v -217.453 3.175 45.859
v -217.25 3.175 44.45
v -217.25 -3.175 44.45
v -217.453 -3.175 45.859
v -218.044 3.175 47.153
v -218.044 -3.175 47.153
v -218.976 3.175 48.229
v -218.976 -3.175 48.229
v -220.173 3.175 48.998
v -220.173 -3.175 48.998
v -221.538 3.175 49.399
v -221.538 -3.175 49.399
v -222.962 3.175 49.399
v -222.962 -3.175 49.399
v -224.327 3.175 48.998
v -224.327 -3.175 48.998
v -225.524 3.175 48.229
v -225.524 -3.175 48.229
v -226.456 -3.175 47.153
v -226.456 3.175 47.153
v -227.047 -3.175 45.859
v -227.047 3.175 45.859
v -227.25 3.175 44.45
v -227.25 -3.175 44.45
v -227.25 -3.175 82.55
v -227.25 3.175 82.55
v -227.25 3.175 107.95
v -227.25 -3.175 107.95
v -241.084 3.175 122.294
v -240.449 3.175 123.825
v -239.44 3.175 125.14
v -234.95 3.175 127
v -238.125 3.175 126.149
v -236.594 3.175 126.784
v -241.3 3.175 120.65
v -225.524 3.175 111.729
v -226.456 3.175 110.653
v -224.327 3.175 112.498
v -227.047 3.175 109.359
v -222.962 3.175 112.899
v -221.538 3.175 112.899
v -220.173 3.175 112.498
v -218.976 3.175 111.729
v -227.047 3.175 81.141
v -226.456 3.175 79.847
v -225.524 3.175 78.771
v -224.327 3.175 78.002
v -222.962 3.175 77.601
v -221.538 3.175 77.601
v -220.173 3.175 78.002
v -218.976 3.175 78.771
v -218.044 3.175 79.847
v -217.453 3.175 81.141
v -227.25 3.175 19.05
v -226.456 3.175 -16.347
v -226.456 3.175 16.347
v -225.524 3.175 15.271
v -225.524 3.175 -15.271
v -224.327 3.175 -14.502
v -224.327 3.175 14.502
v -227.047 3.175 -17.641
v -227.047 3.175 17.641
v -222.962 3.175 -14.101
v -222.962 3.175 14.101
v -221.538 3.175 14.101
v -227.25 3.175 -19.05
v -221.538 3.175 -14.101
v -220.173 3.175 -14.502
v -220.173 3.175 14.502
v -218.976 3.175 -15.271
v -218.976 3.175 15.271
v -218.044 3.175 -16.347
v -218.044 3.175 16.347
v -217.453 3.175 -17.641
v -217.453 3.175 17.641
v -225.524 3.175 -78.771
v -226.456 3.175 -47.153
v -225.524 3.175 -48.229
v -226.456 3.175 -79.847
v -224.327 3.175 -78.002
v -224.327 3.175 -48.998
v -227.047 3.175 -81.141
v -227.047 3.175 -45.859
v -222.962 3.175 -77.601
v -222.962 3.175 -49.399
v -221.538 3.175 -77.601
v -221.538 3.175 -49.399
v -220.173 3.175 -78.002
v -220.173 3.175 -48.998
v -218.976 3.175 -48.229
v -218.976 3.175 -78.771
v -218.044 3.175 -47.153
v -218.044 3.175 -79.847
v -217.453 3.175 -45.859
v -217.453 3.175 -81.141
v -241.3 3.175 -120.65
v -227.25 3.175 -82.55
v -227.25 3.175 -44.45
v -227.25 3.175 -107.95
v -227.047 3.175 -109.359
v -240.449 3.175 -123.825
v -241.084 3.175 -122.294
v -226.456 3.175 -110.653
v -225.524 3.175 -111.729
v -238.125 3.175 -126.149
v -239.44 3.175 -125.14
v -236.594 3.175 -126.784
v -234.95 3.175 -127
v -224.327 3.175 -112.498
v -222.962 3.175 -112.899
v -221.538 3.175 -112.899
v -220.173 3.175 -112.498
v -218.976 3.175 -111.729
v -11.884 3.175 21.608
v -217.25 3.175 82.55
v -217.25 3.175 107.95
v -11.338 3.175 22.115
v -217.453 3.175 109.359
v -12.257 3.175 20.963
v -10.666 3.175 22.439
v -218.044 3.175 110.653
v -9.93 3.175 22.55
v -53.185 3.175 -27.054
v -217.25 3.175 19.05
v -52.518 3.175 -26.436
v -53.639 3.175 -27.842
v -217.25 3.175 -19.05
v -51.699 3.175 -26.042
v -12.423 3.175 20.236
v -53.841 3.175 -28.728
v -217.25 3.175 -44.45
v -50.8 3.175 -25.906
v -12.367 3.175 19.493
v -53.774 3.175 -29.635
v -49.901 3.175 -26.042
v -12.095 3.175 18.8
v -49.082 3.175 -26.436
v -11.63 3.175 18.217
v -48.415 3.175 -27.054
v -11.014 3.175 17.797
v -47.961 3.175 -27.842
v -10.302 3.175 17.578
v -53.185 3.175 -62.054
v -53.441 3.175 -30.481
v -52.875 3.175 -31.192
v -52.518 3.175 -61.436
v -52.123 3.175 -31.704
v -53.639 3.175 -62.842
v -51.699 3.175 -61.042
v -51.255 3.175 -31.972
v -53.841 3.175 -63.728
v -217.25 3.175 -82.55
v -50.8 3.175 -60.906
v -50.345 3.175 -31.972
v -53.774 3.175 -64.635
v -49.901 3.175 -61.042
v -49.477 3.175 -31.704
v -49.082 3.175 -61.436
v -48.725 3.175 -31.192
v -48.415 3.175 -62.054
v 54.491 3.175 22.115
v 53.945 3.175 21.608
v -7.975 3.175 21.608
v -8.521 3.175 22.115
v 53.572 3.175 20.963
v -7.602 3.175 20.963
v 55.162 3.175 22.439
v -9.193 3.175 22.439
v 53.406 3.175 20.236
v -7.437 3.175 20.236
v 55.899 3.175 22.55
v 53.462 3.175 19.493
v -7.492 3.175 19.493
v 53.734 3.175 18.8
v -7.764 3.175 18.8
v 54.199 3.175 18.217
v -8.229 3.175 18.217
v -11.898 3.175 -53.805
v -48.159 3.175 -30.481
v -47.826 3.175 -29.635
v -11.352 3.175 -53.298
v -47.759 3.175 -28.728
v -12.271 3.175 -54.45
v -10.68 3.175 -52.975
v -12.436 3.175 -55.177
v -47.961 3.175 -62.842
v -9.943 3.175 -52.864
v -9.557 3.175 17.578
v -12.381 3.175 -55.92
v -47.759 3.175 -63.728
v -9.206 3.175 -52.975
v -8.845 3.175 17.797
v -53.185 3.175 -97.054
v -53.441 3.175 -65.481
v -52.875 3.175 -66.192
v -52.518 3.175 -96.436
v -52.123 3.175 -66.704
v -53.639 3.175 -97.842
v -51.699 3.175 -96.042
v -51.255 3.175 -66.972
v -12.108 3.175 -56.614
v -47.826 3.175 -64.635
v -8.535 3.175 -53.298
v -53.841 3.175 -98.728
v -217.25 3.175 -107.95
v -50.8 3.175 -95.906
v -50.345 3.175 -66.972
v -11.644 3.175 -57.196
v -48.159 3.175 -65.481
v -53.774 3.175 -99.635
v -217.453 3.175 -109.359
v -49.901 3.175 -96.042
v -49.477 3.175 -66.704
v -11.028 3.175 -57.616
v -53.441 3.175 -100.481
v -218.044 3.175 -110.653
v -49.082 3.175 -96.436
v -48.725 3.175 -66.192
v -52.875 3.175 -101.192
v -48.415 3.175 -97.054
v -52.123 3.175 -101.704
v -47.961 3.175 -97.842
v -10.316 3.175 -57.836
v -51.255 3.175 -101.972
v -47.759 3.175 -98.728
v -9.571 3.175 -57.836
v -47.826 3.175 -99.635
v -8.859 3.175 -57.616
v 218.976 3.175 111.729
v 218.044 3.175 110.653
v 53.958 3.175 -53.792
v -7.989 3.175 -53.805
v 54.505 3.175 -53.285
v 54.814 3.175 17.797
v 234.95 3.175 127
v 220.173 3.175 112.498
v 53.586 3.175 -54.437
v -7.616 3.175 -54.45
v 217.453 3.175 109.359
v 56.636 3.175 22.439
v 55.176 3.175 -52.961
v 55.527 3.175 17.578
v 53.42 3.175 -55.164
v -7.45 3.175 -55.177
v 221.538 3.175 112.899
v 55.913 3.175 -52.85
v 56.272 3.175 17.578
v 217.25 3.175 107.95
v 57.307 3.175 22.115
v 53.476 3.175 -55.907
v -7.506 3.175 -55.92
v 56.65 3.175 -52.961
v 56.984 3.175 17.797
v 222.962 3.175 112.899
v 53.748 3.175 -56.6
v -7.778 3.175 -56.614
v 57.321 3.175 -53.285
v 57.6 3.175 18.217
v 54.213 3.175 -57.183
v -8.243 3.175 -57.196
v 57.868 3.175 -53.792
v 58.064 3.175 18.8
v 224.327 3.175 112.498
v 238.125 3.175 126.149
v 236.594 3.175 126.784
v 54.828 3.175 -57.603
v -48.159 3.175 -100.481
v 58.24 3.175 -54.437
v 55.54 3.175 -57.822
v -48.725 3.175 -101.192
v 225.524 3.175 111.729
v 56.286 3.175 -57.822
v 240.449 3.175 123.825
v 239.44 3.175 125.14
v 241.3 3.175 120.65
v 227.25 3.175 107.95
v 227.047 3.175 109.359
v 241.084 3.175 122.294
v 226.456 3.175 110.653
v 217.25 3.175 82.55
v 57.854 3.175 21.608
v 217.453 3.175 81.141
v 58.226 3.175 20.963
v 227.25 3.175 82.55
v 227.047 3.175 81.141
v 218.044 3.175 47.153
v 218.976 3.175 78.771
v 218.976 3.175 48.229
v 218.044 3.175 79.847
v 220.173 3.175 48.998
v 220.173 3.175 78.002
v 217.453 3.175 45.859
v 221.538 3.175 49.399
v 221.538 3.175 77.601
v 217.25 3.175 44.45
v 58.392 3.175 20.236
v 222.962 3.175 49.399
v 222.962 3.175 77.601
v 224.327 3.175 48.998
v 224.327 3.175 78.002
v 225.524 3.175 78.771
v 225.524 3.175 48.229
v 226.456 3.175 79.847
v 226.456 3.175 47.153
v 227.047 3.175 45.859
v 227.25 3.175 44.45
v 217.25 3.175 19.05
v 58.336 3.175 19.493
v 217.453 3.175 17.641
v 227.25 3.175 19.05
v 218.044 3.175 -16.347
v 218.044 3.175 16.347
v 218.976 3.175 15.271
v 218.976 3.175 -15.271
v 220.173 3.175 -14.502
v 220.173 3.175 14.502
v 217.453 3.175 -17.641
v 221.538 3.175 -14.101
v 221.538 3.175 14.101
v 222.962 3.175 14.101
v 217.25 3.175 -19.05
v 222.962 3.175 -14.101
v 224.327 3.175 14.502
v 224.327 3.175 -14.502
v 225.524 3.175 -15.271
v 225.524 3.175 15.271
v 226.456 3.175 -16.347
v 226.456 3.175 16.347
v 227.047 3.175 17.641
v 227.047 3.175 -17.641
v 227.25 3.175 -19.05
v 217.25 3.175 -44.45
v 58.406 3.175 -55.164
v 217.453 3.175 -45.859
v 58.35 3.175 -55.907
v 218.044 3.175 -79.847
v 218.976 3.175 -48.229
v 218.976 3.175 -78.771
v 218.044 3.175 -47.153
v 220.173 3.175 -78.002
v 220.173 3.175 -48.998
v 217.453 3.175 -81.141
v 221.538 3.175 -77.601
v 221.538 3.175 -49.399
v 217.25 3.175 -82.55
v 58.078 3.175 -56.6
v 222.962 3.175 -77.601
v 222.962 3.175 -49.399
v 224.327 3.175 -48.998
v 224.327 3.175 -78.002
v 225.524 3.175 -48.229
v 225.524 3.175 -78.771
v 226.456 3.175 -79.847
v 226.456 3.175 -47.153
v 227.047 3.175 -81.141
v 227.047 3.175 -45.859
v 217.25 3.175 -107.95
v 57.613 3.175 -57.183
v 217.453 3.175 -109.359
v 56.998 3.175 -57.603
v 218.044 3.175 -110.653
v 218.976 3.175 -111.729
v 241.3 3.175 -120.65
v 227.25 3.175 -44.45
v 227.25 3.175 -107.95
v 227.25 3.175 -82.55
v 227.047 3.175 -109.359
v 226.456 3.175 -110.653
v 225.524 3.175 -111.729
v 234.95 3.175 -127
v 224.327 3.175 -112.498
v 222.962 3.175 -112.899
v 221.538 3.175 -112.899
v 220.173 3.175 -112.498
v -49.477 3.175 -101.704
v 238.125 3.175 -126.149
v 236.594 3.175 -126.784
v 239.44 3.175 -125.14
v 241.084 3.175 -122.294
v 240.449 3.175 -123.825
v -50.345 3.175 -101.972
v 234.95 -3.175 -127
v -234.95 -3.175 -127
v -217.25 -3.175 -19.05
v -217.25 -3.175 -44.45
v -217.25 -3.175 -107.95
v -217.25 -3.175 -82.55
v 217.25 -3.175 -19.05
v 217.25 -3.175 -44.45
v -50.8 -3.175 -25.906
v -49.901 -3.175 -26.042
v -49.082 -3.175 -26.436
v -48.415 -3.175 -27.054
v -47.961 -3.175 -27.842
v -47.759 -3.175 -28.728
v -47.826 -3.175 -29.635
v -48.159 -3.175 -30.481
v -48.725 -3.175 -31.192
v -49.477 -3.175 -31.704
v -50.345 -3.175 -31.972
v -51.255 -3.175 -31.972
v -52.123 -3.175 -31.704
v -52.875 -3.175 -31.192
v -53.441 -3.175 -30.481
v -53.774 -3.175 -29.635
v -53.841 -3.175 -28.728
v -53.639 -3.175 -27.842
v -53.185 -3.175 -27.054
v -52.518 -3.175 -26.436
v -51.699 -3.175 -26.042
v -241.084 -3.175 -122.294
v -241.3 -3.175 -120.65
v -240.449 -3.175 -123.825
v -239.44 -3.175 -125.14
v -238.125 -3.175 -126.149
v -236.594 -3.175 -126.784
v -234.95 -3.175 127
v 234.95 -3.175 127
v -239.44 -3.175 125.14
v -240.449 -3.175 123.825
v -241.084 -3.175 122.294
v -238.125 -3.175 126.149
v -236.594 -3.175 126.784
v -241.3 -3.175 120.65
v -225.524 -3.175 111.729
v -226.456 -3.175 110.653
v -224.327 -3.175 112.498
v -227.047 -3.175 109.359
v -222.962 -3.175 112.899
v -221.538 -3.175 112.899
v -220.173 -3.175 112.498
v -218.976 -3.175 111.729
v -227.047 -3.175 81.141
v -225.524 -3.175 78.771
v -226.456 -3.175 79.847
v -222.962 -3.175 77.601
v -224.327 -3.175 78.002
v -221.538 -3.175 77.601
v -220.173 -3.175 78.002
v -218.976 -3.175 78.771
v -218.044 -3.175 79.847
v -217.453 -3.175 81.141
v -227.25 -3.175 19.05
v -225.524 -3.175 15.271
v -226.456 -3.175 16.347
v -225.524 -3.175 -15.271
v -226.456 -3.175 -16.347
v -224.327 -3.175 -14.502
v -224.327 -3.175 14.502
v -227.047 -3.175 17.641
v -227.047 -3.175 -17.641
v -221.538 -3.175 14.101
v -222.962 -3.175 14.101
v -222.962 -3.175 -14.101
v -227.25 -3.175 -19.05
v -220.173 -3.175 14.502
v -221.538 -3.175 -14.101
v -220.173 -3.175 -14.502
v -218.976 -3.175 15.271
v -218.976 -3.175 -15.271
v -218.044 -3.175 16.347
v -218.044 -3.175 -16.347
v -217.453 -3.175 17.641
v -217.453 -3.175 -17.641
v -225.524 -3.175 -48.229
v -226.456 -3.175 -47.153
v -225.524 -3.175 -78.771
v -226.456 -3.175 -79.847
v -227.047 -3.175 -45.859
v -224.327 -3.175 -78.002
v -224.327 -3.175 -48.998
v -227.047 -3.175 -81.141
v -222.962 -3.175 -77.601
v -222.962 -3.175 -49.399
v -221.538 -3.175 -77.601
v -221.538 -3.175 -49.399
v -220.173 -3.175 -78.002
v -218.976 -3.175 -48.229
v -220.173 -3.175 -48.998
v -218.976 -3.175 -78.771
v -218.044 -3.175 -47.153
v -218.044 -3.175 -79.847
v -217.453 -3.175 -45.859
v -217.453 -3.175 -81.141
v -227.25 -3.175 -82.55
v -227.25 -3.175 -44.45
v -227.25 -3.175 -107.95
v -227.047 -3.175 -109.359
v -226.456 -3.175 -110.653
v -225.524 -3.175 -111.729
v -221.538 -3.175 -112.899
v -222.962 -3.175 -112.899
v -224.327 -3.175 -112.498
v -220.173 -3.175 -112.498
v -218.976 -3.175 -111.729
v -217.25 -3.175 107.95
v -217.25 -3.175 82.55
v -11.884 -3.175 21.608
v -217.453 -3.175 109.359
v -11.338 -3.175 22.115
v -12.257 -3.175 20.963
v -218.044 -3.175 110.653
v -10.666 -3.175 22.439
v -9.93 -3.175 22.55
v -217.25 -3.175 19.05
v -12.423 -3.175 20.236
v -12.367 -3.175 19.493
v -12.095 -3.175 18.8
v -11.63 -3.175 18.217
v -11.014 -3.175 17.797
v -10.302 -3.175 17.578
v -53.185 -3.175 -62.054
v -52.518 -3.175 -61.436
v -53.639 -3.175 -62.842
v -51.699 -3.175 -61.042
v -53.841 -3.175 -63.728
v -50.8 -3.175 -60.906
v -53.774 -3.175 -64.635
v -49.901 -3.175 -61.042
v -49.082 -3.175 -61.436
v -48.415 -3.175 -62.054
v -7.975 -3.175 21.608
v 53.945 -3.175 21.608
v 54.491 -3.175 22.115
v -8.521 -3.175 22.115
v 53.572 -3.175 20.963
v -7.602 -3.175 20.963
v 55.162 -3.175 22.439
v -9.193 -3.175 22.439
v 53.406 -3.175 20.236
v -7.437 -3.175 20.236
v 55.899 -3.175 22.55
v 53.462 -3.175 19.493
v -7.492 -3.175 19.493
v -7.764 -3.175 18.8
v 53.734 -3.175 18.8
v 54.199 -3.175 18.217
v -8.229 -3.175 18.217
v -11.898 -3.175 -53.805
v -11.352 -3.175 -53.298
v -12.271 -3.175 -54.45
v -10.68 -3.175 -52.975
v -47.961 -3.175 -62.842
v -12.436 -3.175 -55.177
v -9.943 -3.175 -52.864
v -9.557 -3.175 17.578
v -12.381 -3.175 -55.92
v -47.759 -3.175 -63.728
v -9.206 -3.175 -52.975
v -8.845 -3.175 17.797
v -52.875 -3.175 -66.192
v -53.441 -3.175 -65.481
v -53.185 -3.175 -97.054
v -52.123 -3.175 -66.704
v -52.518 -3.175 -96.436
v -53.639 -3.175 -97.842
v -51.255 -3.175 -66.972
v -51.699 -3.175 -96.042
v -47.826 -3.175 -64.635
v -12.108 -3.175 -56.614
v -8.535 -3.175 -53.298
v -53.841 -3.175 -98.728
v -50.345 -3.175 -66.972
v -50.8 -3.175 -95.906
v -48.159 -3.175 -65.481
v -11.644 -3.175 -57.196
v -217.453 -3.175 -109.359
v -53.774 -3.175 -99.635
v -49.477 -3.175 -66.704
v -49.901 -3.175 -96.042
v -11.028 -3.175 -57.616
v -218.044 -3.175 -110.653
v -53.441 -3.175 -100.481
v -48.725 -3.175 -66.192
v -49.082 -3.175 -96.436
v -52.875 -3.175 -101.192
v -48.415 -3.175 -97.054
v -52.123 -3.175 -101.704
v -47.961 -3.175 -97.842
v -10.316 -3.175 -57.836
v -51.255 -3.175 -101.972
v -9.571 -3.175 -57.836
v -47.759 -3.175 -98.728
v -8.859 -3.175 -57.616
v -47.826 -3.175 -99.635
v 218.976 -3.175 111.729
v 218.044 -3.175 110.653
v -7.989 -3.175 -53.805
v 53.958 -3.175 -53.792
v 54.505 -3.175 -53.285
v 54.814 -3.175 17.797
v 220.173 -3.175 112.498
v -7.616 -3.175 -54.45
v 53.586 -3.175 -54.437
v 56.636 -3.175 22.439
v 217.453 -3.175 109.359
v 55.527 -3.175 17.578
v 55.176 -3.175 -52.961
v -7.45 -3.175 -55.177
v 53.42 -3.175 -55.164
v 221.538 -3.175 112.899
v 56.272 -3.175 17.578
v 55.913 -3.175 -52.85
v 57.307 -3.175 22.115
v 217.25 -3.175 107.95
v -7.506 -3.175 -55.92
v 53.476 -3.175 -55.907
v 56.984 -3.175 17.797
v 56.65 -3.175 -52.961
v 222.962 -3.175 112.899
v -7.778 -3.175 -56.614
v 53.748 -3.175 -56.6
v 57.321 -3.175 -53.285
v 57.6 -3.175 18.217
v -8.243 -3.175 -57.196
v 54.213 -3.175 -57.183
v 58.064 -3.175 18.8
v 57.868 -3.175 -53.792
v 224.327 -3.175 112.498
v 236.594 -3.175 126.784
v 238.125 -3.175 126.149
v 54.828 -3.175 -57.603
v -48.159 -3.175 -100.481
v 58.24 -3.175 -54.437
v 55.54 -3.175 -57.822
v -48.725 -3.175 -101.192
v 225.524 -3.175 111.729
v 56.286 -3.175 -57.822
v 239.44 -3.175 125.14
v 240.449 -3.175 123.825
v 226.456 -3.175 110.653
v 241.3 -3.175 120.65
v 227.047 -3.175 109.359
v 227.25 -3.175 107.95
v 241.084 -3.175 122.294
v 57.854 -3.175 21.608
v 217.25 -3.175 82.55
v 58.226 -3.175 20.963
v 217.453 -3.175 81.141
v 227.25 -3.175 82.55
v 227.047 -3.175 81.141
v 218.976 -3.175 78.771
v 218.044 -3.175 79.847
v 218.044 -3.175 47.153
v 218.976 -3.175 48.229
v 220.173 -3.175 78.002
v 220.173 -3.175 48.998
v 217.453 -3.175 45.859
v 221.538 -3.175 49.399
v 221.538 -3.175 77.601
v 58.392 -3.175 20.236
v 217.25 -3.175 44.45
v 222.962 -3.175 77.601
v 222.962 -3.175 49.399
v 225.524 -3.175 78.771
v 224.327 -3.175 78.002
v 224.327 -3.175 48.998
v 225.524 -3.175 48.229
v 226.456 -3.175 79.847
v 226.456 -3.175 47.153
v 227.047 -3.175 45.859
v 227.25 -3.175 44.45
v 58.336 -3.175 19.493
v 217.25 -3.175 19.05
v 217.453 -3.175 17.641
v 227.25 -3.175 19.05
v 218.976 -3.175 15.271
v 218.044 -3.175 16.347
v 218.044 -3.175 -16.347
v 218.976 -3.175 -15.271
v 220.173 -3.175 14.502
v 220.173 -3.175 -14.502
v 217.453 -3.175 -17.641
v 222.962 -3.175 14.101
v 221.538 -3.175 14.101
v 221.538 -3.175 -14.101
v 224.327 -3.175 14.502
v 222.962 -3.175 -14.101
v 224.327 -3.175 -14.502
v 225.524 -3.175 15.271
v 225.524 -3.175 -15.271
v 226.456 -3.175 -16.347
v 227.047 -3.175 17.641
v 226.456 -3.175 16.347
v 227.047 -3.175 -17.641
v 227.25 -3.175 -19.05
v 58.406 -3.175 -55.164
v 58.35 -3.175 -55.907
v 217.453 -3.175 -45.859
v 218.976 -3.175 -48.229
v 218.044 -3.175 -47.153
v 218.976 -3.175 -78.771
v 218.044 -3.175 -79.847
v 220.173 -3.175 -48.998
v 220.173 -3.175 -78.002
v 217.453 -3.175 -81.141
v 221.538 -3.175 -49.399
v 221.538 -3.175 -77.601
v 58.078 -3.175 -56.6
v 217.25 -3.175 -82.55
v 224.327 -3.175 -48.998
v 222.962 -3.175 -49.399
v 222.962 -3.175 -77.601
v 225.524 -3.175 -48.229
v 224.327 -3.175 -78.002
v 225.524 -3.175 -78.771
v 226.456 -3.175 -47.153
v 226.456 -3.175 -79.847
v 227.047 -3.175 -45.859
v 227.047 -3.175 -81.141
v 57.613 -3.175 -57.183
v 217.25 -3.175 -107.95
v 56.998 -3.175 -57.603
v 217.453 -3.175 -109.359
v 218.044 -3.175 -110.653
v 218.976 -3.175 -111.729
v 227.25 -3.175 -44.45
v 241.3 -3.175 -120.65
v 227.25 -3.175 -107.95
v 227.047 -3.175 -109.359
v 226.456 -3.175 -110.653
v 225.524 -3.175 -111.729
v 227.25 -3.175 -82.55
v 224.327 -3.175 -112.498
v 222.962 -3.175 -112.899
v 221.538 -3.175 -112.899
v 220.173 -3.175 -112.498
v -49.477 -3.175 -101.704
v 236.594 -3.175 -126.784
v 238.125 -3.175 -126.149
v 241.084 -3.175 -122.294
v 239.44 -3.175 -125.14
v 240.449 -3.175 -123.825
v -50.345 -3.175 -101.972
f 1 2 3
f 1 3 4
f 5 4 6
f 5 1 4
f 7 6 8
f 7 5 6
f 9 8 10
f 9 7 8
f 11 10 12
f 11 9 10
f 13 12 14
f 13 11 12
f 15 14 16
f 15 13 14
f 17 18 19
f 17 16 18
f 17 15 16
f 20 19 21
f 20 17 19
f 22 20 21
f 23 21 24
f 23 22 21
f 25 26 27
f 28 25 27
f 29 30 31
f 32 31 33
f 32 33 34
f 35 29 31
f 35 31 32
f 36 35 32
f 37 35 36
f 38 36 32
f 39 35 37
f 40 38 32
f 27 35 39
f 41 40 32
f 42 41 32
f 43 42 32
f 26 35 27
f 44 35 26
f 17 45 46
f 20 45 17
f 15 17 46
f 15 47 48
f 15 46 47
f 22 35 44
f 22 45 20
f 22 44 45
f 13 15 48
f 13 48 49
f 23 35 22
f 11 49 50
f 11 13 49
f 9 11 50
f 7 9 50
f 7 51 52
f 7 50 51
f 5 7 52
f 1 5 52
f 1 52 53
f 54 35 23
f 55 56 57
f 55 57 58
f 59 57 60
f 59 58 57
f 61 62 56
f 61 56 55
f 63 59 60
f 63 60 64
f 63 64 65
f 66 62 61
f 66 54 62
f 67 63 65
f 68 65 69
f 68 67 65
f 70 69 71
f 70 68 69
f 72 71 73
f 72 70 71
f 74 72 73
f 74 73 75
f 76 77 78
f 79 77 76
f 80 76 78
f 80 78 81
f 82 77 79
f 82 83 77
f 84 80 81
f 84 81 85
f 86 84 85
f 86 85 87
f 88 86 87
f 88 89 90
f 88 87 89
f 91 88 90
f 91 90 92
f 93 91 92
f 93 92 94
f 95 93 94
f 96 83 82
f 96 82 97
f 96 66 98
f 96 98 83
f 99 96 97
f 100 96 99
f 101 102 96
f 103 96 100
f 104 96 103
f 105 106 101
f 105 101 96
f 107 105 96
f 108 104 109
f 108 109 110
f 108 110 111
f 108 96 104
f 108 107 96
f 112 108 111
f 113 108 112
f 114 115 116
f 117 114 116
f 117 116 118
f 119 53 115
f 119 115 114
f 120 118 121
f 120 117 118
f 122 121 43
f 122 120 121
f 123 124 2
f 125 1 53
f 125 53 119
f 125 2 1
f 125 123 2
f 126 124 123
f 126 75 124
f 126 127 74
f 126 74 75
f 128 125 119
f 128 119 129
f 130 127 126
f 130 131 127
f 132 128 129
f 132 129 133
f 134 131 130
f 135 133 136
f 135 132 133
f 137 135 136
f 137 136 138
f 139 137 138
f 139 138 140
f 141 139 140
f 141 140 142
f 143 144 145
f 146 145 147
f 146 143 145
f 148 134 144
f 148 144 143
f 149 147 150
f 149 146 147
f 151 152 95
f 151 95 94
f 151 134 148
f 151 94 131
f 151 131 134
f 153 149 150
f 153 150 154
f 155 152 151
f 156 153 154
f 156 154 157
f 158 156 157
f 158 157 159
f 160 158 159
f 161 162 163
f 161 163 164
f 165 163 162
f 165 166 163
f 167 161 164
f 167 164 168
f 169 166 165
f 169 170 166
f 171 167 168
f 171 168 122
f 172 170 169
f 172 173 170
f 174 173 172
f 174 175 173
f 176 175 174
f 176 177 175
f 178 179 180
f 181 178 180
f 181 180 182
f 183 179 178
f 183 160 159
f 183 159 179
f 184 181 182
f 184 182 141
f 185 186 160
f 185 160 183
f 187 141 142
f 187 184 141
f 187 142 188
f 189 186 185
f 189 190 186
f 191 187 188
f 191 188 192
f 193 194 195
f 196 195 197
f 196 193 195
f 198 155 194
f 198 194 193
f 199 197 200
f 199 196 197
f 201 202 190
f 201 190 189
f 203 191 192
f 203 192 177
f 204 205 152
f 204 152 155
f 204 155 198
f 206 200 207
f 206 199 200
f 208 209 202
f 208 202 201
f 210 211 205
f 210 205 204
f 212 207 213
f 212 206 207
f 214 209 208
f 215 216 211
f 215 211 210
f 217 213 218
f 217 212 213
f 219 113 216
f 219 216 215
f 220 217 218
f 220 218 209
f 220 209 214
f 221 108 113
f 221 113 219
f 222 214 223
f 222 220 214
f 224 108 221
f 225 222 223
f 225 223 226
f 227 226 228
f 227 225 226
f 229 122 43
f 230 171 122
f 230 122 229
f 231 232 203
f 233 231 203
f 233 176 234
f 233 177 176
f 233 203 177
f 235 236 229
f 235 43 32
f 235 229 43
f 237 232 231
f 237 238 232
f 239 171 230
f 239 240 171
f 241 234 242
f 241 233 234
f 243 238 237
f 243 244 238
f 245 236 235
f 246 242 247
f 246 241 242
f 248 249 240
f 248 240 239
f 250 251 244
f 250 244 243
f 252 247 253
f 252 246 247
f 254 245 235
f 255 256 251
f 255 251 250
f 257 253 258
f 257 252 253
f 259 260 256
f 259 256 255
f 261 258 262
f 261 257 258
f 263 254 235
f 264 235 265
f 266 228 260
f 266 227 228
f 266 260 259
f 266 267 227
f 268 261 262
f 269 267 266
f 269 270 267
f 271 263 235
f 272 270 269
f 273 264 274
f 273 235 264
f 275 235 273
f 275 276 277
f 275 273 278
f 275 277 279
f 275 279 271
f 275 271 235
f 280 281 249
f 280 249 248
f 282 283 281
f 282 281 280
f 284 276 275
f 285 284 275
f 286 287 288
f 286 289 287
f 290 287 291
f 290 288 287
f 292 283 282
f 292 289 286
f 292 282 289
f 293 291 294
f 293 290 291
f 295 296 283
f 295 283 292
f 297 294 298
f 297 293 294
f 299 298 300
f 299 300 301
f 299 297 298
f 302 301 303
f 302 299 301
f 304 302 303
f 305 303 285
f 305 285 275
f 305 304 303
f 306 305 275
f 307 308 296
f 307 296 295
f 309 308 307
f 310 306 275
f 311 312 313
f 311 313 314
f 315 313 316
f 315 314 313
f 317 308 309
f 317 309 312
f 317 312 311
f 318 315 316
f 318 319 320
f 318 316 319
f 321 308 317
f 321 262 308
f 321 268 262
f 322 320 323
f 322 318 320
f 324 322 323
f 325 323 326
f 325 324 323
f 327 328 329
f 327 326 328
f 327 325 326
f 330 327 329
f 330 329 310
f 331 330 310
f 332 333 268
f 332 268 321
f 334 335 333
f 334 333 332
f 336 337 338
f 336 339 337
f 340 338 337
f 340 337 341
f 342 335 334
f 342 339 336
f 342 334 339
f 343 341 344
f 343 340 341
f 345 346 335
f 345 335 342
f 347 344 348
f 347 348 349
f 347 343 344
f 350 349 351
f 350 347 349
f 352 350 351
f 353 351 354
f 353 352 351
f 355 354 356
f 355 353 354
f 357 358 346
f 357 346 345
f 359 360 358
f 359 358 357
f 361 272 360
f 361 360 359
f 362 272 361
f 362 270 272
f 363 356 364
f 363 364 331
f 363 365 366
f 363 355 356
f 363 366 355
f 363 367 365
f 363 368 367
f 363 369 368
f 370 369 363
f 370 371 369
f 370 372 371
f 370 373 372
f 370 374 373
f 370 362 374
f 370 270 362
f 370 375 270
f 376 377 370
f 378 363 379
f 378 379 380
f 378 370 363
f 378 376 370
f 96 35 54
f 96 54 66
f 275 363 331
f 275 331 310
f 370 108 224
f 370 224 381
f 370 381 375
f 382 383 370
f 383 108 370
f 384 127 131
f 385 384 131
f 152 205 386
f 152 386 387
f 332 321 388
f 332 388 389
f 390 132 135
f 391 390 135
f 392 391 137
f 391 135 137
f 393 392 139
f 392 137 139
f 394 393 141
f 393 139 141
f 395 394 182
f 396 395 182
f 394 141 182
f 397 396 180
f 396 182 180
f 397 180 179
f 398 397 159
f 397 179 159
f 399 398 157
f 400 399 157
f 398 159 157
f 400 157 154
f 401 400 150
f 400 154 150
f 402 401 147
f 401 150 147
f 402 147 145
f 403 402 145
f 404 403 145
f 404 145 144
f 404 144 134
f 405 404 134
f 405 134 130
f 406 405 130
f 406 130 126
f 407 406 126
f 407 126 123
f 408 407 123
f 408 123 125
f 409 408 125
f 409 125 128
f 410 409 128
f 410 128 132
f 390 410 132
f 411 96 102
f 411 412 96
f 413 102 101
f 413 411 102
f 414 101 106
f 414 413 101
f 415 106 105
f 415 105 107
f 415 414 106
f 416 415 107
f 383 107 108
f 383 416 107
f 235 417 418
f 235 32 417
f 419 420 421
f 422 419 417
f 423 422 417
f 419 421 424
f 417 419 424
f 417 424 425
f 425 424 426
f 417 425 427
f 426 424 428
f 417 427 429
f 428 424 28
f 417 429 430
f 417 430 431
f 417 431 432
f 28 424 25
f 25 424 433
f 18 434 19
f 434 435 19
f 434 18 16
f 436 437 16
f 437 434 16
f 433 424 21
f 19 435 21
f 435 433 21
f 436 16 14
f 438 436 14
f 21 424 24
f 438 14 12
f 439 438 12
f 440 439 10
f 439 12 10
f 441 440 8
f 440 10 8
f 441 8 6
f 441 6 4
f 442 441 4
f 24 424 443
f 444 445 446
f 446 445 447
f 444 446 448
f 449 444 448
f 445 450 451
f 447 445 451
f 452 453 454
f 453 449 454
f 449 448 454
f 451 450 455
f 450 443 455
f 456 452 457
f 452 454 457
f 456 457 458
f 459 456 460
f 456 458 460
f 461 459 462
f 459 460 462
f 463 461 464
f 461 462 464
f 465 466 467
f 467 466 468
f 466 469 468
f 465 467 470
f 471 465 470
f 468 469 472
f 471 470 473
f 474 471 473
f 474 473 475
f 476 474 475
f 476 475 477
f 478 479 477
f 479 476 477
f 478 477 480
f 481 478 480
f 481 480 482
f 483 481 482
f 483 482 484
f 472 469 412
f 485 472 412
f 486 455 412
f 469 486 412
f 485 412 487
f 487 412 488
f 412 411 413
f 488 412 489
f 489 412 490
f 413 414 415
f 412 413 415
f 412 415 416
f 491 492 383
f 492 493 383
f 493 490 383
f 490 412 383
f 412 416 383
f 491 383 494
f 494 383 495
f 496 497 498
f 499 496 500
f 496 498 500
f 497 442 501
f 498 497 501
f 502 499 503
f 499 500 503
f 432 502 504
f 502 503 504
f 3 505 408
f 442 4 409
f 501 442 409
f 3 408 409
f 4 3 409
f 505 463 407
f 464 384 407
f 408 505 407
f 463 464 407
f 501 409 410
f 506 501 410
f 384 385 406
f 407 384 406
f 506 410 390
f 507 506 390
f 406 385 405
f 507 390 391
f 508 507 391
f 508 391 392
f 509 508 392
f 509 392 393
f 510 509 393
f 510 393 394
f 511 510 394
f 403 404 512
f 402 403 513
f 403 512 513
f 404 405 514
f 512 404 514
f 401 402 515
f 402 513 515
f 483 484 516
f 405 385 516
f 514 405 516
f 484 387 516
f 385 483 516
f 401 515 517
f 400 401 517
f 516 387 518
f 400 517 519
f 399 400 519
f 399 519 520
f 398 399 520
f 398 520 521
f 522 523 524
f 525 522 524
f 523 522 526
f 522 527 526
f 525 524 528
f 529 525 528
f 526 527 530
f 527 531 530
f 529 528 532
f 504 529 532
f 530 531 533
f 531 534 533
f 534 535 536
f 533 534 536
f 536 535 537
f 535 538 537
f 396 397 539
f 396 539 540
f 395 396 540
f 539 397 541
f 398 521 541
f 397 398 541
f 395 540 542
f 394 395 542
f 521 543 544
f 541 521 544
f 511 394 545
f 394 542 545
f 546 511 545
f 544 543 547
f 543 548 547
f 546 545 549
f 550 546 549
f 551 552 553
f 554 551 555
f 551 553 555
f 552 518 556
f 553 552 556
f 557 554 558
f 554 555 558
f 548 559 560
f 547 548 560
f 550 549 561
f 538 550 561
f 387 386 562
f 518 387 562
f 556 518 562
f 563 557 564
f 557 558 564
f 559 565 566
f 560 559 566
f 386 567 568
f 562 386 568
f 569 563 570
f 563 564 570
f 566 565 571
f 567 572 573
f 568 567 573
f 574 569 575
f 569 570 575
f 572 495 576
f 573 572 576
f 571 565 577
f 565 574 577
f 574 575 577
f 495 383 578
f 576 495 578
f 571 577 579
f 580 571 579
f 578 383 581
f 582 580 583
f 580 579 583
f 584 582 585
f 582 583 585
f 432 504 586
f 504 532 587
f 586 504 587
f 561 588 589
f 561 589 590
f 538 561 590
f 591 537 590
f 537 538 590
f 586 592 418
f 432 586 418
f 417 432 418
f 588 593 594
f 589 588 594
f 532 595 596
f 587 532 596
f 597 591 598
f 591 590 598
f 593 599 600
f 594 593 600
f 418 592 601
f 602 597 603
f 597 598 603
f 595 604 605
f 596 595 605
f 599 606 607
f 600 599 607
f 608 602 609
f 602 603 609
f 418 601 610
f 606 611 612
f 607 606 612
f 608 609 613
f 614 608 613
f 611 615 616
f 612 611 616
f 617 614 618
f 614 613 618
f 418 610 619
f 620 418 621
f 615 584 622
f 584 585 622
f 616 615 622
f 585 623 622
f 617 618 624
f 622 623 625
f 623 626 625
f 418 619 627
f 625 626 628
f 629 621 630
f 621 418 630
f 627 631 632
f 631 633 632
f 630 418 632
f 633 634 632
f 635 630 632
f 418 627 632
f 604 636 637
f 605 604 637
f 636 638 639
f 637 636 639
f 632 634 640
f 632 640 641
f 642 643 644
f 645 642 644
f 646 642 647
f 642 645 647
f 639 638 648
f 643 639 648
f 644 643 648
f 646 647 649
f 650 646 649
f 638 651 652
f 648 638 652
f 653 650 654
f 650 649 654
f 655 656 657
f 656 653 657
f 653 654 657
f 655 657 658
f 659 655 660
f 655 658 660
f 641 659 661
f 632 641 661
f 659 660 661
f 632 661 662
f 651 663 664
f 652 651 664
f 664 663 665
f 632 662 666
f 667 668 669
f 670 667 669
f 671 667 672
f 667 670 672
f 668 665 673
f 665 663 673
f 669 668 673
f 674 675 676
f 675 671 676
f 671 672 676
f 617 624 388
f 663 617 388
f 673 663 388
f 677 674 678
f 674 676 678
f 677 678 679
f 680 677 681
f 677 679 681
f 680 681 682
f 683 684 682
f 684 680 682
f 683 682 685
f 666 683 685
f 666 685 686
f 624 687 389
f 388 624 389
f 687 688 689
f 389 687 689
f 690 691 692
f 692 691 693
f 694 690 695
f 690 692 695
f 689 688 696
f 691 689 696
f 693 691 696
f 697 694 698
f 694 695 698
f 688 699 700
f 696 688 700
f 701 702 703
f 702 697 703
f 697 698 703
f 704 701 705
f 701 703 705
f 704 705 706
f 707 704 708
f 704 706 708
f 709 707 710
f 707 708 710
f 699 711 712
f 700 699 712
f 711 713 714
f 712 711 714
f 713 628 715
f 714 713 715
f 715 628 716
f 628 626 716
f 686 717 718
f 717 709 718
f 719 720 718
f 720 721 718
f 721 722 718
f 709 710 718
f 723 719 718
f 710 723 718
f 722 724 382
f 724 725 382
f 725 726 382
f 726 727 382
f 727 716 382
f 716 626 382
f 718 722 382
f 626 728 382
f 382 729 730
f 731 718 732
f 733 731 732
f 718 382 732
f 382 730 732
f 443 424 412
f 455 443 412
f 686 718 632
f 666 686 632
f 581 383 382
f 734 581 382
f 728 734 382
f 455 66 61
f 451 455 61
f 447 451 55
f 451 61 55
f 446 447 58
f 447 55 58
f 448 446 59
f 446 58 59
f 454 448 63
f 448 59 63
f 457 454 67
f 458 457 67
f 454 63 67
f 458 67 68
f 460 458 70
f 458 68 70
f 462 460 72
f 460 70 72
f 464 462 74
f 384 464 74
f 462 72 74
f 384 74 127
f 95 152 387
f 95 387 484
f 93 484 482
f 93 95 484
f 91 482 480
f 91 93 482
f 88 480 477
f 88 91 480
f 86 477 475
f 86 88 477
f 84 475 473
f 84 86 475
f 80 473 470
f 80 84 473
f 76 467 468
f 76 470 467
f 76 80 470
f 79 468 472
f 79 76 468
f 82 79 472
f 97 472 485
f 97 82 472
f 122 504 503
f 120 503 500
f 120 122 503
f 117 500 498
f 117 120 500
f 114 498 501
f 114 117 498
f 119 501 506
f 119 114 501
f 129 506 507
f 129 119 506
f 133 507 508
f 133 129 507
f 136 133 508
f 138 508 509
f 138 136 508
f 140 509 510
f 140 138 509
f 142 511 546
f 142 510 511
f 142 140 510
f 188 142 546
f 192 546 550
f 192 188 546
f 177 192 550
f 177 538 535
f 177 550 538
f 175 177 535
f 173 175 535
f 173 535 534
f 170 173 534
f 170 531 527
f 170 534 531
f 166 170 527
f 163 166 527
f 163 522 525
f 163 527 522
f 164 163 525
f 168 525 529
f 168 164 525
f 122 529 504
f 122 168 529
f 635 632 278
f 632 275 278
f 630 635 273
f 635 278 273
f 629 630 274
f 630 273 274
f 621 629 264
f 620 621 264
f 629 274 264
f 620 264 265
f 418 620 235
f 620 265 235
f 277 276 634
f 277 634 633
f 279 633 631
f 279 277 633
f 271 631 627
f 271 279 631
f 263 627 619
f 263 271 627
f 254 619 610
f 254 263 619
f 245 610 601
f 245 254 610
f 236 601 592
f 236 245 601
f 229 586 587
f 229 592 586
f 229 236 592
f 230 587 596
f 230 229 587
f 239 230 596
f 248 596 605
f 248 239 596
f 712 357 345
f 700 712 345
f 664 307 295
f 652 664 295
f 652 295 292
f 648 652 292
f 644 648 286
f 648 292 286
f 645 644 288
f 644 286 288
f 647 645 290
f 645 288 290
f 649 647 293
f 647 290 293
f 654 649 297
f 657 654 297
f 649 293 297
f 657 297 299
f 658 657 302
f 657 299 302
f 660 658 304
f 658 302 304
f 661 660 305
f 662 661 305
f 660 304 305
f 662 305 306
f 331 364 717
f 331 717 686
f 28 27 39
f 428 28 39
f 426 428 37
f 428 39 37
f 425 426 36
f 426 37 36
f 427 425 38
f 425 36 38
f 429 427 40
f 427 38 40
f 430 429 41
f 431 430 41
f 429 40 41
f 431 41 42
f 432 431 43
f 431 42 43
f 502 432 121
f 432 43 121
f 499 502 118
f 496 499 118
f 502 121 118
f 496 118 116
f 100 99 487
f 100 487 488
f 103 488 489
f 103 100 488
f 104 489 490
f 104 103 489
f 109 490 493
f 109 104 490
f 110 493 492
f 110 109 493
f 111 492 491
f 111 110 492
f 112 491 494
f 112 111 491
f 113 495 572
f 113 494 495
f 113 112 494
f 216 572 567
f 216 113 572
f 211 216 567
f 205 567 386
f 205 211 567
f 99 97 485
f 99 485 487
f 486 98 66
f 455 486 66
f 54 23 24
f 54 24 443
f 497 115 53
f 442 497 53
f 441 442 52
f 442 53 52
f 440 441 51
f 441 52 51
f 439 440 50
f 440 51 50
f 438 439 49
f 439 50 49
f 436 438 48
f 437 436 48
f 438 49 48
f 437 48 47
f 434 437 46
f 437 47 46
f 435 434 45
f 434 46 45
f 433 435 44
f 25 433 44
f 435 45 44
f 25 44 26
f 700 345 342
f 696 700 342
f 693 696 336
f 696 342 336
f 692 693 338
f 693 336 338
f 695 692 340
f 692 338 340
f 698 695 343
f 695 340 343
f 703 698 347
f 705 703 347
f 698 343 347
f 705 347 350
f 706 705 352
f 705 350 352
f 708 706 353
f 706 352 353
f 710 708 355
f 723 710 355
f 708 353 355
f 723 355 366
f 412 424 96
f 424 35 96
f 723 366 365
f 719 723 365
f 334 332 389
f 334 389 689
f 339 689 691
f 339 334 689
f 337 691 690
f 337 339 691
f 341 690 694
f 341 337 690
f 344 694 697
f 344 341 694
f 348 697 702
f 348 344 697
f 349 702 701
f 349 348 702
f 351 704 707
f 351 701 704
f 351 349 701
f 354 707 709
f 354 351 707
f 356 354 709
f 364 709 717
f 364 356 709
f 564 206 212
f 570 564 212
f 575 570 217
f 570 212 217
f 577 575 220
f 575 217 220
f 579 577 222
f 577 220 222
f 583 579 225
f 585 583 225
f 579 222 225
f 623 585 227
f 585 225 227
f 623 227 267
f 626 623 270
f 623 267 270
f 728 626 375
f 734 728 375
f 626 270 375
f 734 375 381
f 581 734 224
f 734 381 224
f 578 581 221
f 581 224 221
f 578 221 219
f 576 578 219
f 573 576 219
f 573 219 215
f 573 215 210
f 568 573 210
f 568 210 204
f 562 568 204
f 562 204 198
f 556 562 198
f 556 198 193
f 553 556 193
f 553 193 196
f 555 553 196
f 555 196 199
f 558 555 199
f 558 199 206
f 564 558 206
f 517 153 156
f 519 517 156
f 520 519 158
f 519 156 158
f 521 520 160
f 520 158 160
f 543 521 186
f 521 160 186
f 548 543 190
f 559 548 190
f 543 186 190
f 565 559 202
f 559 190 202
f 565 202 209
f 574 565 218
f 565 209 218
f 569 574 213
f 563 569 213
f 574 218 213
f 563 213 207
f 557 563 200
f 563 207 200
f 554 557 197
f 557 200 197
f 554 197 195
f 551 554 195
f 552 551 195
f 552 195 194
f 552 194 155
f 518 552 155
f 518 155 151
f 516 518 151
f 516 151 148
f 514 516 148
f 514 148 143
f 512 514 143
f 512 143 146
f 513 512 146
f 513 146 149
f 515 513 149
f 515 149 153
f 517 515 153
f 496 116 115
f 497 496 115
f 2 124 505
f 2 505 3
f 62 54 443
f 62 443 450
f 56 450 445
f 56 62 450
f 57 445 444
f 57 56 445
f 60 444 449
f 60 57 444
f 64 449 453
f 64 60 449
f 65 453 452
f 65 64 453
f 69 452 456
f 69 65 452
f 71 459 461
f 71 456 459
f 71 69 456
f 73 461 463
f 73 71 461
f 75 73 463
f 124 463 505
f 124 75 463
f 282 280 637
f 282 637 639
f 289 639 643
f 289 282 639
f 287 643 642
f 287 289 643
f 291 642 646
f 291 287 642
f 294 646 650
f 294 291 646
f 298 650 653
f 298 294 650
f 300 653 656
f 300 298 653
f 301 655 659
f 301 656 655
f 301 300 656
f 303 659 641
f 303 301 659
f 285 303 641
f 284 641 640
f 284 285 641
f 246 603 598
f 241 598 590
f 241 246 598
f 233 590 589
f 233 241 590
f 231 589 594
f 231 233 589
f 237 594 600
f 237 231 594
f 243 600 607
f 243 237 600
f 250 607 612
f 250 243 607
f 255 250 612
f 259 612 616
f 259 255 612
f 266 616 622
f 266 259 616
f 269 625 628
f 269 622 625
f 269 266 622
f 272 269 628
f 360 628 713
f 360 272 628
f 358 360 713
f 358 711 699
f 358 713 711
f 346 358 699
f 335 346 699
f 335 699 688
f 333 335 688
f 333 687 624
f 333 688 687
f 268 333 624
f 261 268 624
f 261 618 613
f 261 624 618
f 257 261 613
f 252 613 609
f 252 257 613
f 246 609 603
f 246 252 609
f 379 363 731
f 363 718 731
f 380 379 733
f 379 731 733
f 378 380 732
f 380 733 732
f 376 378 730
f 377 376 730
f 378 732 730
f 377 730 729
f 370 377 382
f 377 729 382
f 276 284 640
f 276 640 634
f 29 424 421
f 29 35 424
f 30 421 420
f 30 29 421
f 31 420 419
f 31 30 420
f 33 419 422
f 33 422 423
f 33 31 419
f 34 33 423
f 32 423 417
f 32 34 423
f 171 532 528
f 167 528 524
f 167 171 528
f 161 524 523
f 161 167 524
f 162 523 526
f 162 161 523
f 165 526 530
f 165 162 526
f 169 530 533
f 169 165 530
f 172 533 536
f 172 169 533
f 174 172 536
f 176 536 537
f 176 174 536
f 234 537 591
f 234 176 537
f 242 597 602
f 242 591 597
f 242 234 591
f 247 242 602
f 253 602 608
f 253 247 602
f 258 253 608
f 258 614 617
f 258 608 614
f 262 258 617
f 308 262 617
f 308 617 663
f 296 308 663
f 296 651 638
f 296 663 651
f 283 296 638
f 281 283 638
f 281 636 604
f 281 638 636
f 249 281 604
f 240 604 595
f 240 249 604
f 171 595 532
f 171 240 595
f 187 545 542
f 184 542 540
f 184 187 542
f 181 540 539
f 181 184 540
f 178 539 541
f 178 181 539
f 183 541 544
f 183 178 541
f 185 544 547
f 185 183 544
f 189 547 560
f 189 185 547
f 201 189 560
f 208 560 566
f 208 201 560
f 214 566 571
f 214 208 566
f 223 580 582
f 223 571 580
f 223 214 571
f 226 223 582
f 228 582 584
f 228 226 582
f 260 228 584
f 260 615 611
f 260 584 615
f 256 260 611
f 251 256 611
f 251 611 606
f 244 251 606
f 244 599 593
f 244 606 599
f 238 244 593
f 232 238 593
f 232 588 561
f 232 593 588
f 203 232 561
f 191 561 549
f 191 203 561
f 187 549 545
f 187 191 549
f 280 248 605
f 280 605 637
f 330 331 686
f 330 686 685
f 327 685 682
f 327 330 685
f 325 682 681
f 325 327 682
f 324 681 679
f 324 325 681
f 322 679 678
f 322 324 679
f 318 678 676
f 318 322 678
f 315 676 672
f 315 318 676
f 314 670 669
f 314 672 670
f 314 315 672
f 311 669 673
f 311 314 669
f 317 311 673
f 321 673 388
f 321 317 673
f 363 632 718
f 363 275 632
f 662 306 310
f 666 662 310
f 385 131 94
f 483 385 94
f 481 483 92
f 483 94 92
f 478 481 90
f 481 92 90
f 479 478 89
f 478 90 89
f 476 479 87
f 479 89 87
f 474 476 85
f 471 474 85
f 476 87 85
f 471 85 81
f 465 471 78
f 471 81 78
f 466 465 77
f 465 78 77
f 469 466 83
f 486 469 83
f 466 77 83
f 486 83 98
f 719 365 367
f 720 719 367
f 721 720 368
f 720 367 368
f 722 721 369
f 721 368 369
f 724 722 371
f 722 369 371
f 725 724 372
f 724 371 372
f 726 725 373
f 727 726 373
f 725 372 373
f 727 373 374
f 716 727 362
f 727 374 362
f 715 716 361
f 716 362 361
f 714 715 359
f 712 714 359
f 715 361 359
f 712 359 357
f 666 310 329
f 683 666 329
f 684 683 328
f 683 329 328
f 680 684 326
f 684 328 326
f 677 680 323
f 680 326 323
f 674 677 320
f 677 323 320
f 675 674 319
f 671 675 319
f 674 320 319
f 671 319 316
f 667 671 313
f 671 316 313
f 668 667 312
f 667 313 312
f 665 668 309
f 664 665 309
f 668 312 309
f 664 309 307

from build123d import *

# Parameters (mm, degrees)
SKETCH1_W           = 482.6
SKETCH1_H           = 254
BOSS_EXTRUDE1_DEPTH = 3.175
FILLET1_R           = 6.35
CUT_EXTRUDE1_REACH  = 274.754
SKETCH3_R           = 3.05
CUT_EXTRUDE2_DEPTH  = 273.754491255
SKETCH4_R           = 2.5
CUT_EXTRUDE3_DEPTH  = 10


with BuildPart() as part:
    # Sketch1 → Boss-Extrude1 (new, symmetric)
    with BuildSketch(Plane(origin=(0, 0, 0), x_dir=(1, 0, 0), z_dir=(0, 1, 0))):
        Rectangle(SKETCH1_W, SKETCH1_H)
    extrude(amount=BOSS_EXTRUDE1_DEPTH, both=True)

    # Fillet1
    fillet1_edges = [part.edges().sort_by_distance(p)[0] for p in [
        (241.3, 0, 127),
        (-241.3, 0, 127),
        (-241.3, 0, -127),
        (241.3, 0, -127),
    ]]
    fillet(fillet1_edges, radius=FILLET1_R)

    # Sketch2 → Cut-Extrude1 (cut, up to next)
    with BuildSketch(Plane(origin=(0, 3.175, 0), x_dir=(1, 0, 0), z_dir=(0, 1, 0)), mode=Mode.PRIVATE) as cut_extrude1_sk1:
        with BuildLine():
            Line((227.25, -82.55), (227.25, -107.95))
            ThreePointArc((227.25, -107.95), (222.25, -112.95), (217.25, -107.95))
            Line((217.25, -107.95), (217.25, -82.55))
            ThreePointArc((217.25, -82.55), (222.25, -77.55), (227.25, -82.55))
        make_face()
    cut_extrude1_tool1 = extrude(cut_extrude1_sk1.sketch, amount=-CUT_EXTRUDE1_REACH, mode=Mode.PRIVATE) & part.part
    # Sketch2 → Cut-Extrude1 (cut, up to next)
    with BuildSketch(Plane(origin=(0, 3.175, 0), x_dir=(1, 0, 0), z_dir=(0, 1, 0)), mode=Mode.PRIVATE) as cut_extrude1_sk2:
        with BuildLine():
            Line((227.25, -44.45), (227.25, -19.05))
            ThreePointArc((227.25, -19.05), (222.25, -14.05), (217.25, -19.05))
            Line((217.25, -19.05), (217.25, -44.45))
            ThreePointArc((217.25, -44.45), (222.25, -49.45), (227.25, -44.45))
        make_face()
    cut_extrude1_tool2 = extrude(cut_extrude1_sk2.sketch, amount=-CUT_EXTRUDE1_REACH, mode=Mode.PRIVATE) & part.part
    # Sketch2 → Cut-Extrude1 (cut, up to next)
    with BuildSketch(Plane(origin=(0, 3.175, 0), x_dir=(1, 0, 0), z_dir=(0, 1, 0)), mode=Mode.PRIVATE) as cut_extrude1_sk3:
        with BuildLine():
            Line((227.25, 44.45), (227.25, 19.05))
            ThreePointArc((227.25, 19.05), (222.25, 14.05), (217.25, 19.05))
            Line((217.25, 19.05), (217.25, 44.45))
            ThreePointArc((217.25, 44.45), (222.25, 49.45), (227.25, 44.45))
        make_face()
    cut_extrude1_tool3 = extrude(cut_extrude1_sk3.sketch, amount=-CUT_EXTRUDE1_REACH, mode=Mode.PRIVATE) & part.part
    # Sketch2 → Cut-Extrude1 (cut, up to next)
    with BuildSketch(Plane(origin=(0, 3.175, 0), x_dir=(1, 0, 0), z_dir=(0, 1, 0)), mode=Mode.PRIVATE) as cut_extrude1_sk4:
        with BuildLine():
            Line((227.25, 82.55), (227.25, 107.95))
            ThreePointArc((227.25, 107.95), (222.25, 112.95), (217.25, 107.95))
            Line((217.25, 107.95), (217.25, 82.55))
            ThreePointArc((217.25, 82.55), (222.25, 77.55), (227.25, 82.55))
        make_face()
    cut_extrude1_tool4 = extrude(cut_extrude1_sk4.sketch, amount=-CUT_EXTRUDE1_REACH, mode=Mode.PRIVATE) & part.part
    # Sketch2 → Cut-Extrude1 (cut, up to next)
    with BuildSketch(Plane(origin=(0, 3.175, 0), x_dir=(1, 0, 0), z_dir=(0, 1, 0)), mode=Mode.PRIVATE) as cut_extrude1_sk5:
        with BuildLine():
            Line((-227.25, 82.55), (-227.25, 107.95))
            ThreePointArc((-227.25, 107.95), (-222.25, 112.95), (-217.25, 107.95))
            Line((-217.25, 107.95), (-217.25, 82.55))
            ThreePointArc((-217.25, 82.55), (-222.25, 77.55), (-227.25, 82.55))
        make_face()
    cut_extrude1_tool5 = extrude(cut_extrude1_sk5.sketch, amount=-CUT_EXTRUDE1_REACH, mode=Mode.PRIVATE) & part.part
    # Sketch2 → Cut-Extrude1 (cut, up to next)
    with BuildSketch(Plane(origin=(0, 3.175, 0), x_dir=(1, 0, 0), z_dir=(0, 1, 0)), mode=Mode.PRIVATE) as cut_extrude1_sk6:
        with BuildLine():
            Line((-227.25, 44.45), (-227.25, 19.05))
            ThreePointArc((-227.25, 19.05), (-222.25, 14.05), (-217.25, 19.05))
            Line((-217.25, 19.05), (-217.25, 44.45))
            ThreePointArc((-217.25, 44.45), (-222.25, 49.45), (-227.25, 44.45))
        make_face()
    cut_extrude1_tool6 = extrude(cut_extrude1_sk6.sketch, amount=-CUT_EXTRUDE1_REACH, mode=Mode.PRIVATE) & part.part
    # Sketch2 → Cut-Extrude1 (cut, up to next)
    with BuildSketch(Plane(origin=(0, 3.175, 0), x_dir=(1, 0, 0), z_dir=(0, 1, 0)), mode=Mode.PRIVATE) as cut_extrude1_sk7:
        with BuildLine():
            Line((-227.25, -44.45), (-227.25, -19.05))
            ThreePointArc((-227.25, -19.05), (-222.25, -14.05), (-217.25, -19.05))
            Line((-217.25, -19.05), (-217.25, -44.45))
            ThreePointArc((-217.25, -44.45), (-222.25, -49.45), (-227.25, -44.45))
        make_face()
    cut_extrude1_tool7 = extrude(cut_extrude1_sk7.sketch, amount=-CUT_EXTRUDE1_REACH, mode=Mode.PRIVATE) & part.part
    # Sketch2 → Cut-Extrude1 (cut, up to next)
    with BuildSketch(Plane(origin=(0, 3.175, 0), x_dir=(1, 0, 0), z_dir=(0, 1, 0)), mode=Mode.PRIVATE) as cut_extrude1_sk8:
        with BuildLine():
            Line((-227.25, -82.55), (-227.25, -107.95))
            ThreePointArc((-227.25, -107.95), (-222.25, -112.95), (-217.25, -107.95))
            Line((-217.25, -107.95), (-217.25, -82.55))
            ThreePointArc((-217.25, -82.55), (-222.25, -77.55), (-227.25, -82.55))
        make_face()
    cut_extrude1_tool8 = extrude(cut_extrude1_sk8.sketch, amount=-CUT_EXTRUDE1_REACH, mode=Mode.PRIVATE) & part.part
    add(cut_extrude1_tool1.solids().sort_by_distance((222.25, 3.175, 95.25))[0], mode=Mode.SUBTRACT)
    add(cut_extrude1_tool2.solids().sort_by_distance((222.25, 3.175, 31.75))[0], mode=Mode.SUBTRACT)
    add(cut_extrude1_tool3.solids().sort_by_distance((222.25, 3.175, -31.75))[0], mode=Mode.SUBTRACT)
    add(cut_extrude1_tool4.solids().sort_by_distance((222.25, 3.175, -95.25))[0], mode=Mode.SUBTRACT)
    add(cut_extrude1_tool5.solids().sort_by_distance((-222.25, 3.175, -95.25))[0], mode=Mode.SUBTRACT)
    add(cut_extrude1_tool6.solids().sort_by_distance((-222.25, 3.175, -31.75))[0], mode=Mode.SUBTRACT)
    add(cut_extrude1_tool7.solids().sort_by_distance((-222.25, 3.175, 31.75))[0], mode=Mode.SUBTRACT)
    add(cut_extrude1_tool8.solids().sort_by_distance((-222.25, 3.175, 95.25))[0], mode=Mode.SUBTRACT)

    # Sketch3 → Cut-Extrude2 (cut, through all)
    with BuildSketch(Plane(origin=(0, 3.175, 0), x_dir=(1, 0, 0), z_dir=(0, 1, 0))):
        with Locations(Location((-50.8, 98.955999998, 0), (0, 0, 270))):
            Circle(SKETCH3_R)
        with Locations(Location((-50.8, 63.955999998, 0), (0, 0, 270))):
            Circle(SKETCH3_R)
        with Locations(Location((-50.8, 28.955999998, 0), (0, 0, 270))):
            Circle(SKETCH3_R)
    extrude(amount=-CUT_EXTRUDE2_DEPTH, mode=Mode.SUBTRACT)

    # Sketch4 → Cut-Extrude3 (cut)
    with BuildSketch(Plane.XZ.offset(-3.175)):
        with Locations(Location((55.899172715, 20.049660002, 0), (0, 0, 90))):
            Circle(SKETCH4_R)
        with Locations(Location((-9.929521758, 20.049660002, 0), (0, 0, 90))):
            Circle(SKETCH4_R)
        with Locations(Location((55.912941777, -55.350339998, 0), (0, 0, 90))):
            Circle(SKETCH4_R)
        with Locations(Location((-9.943351442, -55.363639998, 0), (0, 0, 90))):
            Circle(SKETCH4_R)
    extrude(amount=CUT_EXTRUDE3_DEPTH, mode=Mode.SUBTRACT)


solid = part.part
